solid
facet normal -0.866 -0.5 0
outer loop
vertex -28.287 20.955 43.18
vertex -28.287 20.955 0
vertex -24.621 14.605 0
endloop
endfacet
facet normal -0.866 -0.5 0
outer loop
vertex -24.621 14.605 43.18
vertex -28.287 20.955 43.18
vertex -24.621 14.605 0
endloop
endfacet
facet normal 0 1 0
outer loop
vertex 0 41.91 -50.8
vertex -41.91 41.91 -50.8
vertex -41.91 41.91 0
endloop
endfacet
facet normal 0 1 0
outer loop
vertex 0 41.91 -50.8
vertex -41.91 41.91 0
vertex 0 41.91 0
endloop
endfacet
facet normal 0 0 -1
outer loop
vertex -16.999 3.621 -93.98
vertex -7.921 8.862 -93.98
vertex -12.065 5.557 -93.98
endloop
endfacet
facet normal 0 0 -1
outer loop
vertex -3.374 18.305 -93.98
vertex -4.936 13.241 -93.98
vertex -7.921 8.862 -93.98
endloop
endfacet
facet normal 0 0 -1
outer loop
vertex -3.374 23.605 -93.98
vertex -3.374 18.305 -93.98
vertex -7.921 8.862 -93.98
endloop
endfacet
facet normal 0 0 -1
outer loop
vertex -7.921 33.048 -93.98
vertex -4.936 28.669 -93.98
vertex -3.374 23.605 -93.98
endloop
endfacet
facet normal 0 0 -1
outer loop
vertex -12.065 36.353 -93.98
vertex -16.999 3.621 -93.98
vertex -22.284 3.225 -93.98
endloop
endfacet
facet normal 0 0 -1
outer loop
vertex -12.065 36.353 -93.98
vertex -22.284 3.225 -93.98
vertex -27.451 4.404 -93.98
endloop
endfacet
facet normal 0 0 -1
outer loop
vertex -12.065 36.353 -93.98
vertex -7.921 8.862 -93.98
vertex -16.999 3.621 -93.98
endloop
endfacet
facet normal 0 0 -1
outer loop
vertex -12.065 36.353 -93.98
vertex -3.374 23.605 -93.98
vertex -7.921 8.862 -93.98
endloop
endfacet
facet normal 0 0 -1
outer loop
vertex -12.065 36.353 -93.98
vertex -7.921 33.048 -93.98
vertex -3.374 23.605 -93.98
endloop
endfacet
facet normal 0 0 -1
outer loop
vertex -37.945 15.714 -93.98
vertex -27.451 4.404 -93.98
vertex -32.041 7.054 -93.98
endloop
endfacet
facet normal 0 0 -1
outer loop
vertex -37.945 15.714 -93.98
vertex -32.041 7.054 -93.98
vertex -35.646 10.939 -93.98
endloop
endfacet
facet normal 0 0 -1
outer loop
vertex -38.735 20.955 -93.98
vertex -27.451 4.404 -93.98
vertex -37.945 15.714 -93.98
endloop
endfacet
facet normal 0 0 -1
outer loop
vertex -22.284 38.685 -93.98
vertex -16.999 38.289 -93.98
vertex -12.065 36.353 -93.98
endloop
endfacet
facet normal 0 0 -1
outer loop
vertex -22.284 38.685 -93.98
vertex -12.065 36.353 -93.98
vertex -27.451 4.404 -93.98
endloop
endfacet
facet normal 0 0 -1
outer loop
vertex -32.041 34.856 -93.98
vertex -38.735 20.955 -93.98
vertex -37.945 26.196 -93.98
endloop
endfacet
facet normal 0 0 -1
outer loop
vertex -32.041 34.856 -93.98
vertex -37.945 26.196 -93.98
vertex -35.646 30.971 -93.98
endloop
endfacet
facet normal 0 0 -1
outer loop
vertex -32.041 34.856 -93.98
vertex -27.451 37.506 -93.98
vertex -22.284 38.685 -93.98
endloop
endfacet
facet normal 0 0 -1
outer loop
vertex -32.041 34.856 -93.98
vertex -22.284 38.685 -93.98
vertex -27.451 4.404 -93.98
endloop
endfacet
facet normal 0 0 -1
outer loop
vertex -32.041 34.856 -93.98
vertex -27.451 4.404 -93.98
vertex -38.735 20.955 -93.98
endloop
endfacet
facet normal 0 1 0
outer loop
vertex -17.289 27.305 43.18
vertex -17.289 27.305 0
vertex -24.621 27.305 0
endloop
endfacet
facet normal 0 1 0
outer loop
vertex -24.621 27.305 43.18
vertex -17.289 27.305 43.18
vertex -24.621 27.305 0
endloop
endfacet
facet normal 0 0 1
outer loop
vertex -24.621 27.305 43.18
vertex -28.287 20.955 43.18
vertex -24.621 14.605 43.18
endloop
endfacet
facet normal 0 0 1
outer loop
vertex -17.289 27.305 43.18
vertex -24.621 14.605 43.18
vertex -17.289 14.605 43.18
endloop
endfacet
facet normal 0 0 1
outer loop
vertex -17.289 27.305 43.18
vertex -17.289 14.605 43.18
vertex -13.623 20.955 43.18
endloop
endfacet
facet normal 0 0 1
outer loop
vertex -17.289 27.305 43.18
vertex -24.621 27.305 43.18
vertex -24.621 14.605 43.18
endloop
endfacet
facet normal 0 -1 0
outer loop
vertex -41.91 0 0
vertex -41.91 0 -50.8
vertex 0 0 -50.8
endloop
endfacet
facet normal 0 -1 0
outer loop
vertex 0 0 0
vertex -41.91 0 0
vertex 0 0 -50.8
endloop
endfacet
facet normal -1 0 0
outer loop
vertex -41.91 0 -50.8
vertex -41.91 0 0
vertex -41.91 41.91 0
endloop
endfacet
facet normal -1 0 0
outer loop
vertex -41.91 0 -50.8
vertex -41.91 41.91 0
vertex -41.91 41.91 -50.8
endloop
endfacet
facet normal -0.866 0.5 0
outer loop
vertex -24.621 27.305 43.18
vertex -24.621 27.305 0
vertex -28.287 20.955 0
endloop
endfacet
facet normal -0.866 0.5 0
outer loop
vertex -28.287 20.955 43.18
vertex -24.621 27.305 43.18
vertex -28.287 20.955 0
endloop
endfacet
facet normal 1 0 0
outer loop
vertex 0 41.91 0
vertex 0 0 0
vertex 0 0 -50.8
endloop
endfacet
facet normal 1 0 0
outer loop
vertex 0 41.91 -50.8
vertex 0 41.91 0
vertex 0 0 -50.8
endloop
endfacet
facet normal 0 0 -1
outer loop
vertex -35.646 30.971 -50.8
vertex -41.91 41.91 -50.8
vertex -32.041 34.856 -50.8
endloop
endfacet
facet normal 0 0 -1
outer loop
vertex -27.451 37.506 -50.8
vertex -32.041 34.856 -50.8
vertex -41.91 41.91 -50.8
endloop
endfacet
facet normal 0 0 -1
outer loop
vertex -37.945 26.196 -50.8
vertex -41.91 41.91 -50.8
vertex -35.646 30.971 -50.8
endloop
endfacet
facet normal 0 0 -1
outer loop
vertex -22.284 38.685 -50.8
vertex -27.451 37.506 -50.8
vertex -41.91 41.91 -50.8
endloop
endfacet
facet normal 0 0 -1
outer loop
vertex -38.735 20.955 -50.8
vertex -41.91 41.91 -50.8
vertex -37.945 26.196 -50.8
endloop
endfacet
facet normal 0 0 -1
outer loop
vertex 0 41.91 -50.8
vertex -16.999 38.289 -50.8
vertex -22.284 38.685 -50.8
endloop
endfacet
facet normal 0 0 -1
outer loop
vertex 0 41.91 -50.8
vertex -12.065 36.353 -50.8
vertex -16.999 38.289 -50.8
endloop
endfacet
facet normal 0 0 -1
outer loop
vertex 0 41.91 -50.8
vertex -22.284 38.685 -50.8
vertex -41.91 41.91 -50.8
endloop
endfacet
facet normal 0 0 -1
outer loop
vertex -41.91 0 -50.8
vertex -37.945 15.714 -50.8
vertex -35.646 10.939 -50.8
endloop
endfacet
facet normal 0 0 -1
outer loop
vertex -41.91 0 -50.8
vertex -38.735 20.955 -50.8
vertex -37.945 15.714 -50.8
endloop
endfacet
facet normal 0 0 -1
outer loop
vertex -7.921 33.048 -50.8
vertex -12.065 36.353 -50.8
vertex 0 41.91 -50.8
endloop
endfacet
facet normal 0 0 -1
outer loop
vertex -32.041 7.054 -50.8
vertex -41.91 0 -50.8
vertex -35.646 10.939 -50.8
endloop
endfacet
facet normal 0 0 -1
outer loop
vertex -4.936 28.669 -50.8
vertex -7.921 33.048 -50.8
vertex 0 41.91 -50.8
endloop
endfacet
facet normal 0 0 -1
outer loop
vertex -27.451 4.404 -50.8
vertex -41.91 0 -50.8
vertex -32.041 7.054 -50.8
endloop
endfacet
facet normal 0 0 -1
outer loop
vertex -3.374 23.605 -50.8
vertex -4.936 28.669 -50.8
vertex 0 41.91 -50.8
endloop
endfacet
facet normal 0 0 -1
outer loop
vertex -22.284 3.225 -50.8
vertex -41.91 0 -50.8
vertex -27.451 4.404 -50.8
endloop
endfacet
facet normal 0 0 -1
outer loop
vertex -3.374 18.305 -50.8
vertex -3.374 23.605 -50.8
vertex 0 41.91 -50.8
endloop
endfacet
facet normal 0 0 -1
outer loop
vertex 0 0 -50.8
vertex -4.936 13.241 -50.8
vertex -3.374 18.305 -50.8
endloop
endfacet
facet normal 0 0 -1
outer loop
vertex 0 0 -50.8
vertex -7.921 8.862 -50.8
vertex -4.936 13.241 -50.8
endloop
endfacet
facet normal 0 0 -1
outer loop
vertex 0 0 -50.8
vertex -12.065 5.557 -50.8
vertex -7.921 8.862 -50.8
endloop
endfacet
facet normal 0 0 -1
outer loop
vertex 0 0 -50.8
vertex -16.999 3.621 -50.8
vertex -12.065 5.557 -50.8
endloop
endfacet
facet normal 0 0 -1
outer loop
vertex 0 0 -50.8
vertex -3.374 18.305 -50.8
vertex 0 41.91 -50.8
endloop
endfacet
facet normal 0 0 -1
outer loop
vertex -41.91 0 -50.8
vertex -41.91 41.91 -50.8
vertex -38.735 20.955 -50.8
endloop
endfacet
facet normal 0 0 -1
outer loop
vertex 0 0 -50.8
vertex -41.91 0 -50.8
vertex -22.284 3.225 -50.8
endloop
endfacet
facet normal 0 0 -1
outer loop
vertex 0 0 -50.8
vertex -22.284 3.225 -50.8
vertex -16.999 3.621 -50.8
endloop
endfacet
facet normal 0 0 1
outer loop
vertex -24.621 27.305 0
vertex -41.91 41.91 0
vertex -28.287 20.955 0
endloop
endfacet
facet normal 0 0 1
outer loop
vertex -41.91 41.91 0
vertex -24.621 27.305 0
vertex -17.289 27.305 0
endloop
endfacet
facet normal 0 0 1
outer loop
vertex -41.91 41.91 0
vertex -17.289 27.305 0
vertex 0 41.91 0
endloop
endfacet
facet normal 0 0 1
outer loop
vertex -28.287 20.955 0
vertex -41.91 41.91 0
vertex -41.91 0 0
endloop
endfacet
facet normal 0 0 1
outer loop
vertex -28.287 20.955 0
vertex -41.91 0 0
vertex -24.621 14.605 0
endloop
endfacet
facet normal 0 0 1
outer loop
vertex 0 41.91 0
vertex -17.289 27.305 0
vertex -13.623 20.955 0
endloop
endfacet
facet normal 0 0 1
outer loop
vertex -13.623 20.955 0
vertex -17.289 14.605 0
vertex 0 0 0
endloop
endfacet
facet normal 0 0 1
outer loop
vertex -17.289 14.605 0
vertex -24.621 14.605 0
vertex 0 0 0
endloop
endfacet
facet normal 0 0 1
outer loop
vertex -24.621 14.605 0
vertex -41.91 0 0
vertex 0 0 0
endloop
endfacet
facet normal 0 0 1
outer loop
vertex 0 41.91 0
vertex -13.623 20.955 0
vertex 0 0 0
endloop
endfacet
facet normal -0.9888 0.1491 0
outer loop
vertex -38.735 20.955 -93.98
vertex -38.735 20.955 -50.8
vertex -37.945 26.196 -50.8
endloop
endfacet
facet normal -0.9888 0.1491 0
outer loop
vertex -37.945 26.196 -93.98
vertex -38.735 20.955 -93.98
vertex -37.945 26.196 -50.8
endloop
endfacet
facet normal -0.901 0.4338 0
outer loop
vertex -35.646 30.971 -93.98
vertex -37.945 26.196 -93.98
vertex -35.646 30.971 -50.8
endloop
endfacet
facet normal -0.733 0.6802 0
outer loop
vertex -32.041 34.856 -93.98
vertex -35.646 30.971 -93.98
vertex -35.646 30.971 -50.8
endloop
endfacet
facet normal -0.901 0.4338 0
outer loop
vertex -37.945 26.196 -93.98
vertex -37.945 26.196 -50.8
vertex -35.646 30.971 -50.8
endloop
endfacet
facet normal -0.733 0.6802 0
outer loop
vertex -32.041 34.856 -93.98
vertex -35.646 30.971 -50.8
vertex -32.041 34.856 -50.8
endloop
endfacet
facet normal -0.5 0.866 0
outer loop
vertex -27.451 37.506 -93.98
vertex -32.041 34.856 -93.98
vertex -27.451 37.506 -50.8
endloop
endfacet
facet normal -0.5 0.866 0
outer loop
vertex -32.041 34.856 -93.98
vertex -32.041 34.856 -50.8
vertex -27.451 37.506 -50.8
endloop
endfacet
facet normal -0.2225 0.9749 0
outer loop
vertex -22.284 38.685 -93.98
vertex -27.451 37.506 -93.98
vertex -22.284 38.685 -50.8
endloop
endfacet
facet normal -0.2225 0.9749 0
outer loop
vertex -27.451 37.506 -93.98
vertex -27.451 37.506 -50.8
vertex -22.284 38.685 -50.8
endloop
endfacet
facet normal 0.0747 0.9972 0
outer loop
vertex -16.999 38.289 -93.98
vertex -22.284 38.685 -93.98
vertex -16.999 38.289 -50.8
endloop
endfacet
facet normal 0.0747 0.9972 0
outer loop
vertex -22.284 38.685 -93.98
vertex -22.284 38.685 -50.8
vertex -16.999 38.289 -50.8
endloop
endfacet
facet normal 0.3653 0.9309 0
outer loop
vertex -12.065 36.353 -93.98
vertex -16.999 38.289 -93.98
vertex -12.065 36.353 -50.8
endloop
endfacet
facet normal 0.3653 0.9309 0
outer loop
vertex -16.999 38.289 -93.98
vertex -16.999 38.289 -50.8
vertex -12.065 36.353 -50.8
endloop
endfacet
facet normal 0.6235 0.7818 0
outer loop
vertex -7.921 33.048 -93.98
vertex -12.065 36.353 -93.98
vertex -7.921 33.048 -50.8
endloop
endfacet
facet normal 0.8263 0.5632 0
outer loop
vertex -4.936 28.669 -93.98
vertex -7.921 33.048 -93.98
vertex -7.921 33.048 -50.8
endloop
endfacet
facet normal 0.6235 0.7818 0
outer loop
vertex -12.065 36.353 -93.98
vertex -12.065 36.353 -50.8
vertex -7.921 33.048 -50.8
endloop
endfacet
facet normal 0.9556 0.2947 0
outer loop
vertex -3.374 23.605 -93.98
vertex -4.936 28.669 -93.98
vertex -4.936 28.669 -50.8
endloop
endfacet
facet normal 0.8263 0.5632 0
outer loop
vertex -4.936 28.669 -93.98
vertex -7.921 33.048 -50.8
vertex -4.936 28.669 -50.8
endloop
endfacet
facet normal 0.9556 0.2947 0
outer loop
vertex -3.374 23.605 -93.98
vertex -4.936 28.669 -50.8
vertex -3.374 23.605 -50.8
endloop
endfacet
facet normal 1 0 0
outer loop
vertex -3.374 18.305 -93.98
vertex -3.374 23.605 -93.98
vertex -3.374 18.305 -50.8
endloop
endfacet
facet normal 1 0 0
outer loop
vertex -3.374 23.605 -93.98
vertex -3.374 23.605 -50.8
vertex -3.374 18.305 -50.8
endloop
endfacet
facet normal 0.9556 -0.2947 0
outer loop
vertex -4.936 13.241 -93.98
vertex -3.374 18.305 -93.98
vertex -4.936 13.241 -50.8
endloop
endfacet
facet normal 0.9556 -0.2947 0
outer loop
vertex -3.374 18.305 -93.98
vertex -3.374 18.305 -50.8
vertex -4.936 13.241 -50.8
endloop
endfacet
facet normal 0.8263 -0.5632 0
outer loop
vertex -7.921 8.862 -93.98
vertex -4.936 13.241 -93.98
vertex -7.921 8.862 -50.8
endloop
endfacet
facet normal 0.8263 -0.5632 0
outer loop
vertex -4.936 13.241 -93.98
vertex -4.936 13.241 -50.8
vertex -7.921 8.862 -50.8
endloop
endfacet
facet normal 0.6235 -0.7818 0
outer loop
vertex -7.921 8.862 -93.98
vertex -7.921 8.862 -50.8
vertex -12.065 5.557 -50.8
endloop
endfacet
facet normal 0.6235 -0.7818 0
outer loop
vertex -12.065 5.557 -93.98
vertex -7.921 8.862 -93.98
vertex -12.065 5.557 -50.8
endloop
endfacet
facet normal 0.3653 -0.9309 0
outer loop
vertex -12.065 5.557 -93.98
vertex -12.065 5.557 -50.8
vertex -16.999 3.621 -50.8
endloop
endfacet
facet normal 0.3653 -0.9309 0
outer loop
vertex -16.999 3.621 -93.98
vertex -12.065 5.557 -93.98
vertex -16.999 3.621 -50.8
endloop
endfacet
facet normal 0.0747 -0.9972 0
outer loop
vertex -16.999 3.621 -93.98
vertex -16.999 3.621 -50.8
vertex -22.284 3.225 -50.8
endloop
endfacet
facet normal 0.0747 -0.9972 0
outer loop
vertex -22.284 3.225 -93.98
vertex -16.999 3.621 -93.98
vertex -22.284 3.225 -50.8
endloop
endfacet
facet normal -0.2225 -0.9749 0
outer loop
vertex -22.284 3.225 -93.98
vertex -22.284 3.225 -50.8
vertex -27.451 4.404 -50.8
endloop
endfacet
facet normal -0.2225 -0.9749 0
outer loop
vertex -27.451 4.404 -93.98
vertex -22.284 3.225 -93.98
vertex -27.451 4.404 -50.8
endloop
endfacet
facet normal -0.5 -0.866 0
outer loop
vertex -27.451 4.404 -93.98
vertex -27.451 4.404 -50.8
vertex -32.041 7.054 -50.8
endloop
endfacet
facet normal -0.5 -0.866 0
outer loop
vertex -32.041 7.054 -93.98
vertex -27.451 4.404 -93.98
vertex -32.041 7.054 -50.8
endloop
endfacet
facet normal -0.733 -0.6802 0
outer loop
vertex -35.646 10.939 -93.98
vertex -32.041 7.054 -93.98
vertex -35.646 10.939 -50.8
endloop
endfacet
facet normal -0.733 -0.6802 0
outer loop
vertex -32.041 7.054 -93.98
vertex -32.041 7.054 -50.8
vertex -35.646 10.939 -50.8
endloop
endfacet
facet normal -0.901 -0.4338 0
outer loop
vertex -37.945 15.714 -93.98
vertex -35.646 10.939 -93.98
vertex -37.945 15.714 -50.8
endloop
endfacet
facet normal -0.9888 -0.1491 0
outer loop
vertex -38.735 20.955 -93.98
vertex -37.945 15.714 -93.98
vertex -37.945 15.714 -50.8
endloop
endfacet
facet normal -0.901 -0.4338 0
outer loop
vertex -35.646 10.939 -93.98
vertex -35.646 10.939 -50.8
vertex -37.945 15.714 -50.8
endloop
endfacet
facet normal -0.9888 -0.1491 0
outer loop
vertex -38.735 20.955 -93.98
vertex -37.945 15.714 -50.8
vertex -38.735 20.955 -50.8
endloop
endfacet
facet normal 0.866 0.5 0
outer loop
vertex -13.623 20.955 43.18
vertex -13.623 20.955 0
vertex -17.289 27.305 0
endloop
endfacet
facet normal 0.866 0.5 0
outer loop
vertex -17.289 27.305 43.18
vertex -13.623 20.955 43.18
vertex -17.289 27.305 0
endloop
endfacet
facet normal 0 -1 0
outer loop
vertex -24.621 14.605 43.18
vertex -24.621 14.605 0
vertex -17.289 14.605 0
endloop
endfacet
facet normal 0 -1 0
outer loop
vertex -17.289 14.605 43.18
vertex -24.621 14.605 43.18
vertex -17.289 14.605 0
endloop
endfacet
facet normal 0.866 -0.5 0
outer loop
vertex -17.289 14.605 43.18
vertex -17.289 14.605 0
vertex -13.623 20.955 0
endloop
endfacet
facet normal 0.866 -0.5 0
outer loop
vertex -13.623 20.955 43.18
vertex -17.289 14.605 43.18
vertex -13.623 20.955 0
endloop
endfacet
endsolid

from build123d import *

# Parameters (mm, degrees)
SKETCH1_W           = 41.91
SKETCH1_H           = 50.8
BOSS_EXTRUDE1_DEPTH = 41.91
SKETCH2_R           = 17.78
BOSS_EXTRUDE2_DEPTH = 43.18
BOSS_EXTRUDE4_DEPTH = 43.18


with BuildPart() as part:
    # Sketch1 → Boss-Extrude1 (new body)
    with BuildSketch(Plane(origin=(0, 0, 0), x_dir=(1, 0, 0), z_dir=(0, 1, 0))):
        with Locations((-20.955, 25.4)):
            Rectangle(SKETCH1_W, SKETCH1_H)
    extrude(amount=BOSS_EXTRUDE1_DEPTH)

    # Sketch2 → Boss-Extrude2 (add)
    with BuildSketch(Plane(origin=(0, 0, -50.8), x_dir=(-1, 0, 0), z_dir=(0, 0, -1))):
        with Locations((20.955, 20.955)):
            Circle(SKETCH2_R)
    extrude(amount=BOSS_EXTRUDE2_DEPTH)

    # Sketch3 → Boss-Extrude4 (add)
    with BuildSketch(Plane.XY):
        Polygon((-13.622651581, 20.955), (-17.288825791, 27.305), (-24.621174209, 27.305), (-28.287348419, 20.955), (-24.621174209, 14.605), (-17.288825791, 14.605), align=None)
    extrude(amount=BOSS_EXTRUDE4_DEPTH)


solid = part.part
